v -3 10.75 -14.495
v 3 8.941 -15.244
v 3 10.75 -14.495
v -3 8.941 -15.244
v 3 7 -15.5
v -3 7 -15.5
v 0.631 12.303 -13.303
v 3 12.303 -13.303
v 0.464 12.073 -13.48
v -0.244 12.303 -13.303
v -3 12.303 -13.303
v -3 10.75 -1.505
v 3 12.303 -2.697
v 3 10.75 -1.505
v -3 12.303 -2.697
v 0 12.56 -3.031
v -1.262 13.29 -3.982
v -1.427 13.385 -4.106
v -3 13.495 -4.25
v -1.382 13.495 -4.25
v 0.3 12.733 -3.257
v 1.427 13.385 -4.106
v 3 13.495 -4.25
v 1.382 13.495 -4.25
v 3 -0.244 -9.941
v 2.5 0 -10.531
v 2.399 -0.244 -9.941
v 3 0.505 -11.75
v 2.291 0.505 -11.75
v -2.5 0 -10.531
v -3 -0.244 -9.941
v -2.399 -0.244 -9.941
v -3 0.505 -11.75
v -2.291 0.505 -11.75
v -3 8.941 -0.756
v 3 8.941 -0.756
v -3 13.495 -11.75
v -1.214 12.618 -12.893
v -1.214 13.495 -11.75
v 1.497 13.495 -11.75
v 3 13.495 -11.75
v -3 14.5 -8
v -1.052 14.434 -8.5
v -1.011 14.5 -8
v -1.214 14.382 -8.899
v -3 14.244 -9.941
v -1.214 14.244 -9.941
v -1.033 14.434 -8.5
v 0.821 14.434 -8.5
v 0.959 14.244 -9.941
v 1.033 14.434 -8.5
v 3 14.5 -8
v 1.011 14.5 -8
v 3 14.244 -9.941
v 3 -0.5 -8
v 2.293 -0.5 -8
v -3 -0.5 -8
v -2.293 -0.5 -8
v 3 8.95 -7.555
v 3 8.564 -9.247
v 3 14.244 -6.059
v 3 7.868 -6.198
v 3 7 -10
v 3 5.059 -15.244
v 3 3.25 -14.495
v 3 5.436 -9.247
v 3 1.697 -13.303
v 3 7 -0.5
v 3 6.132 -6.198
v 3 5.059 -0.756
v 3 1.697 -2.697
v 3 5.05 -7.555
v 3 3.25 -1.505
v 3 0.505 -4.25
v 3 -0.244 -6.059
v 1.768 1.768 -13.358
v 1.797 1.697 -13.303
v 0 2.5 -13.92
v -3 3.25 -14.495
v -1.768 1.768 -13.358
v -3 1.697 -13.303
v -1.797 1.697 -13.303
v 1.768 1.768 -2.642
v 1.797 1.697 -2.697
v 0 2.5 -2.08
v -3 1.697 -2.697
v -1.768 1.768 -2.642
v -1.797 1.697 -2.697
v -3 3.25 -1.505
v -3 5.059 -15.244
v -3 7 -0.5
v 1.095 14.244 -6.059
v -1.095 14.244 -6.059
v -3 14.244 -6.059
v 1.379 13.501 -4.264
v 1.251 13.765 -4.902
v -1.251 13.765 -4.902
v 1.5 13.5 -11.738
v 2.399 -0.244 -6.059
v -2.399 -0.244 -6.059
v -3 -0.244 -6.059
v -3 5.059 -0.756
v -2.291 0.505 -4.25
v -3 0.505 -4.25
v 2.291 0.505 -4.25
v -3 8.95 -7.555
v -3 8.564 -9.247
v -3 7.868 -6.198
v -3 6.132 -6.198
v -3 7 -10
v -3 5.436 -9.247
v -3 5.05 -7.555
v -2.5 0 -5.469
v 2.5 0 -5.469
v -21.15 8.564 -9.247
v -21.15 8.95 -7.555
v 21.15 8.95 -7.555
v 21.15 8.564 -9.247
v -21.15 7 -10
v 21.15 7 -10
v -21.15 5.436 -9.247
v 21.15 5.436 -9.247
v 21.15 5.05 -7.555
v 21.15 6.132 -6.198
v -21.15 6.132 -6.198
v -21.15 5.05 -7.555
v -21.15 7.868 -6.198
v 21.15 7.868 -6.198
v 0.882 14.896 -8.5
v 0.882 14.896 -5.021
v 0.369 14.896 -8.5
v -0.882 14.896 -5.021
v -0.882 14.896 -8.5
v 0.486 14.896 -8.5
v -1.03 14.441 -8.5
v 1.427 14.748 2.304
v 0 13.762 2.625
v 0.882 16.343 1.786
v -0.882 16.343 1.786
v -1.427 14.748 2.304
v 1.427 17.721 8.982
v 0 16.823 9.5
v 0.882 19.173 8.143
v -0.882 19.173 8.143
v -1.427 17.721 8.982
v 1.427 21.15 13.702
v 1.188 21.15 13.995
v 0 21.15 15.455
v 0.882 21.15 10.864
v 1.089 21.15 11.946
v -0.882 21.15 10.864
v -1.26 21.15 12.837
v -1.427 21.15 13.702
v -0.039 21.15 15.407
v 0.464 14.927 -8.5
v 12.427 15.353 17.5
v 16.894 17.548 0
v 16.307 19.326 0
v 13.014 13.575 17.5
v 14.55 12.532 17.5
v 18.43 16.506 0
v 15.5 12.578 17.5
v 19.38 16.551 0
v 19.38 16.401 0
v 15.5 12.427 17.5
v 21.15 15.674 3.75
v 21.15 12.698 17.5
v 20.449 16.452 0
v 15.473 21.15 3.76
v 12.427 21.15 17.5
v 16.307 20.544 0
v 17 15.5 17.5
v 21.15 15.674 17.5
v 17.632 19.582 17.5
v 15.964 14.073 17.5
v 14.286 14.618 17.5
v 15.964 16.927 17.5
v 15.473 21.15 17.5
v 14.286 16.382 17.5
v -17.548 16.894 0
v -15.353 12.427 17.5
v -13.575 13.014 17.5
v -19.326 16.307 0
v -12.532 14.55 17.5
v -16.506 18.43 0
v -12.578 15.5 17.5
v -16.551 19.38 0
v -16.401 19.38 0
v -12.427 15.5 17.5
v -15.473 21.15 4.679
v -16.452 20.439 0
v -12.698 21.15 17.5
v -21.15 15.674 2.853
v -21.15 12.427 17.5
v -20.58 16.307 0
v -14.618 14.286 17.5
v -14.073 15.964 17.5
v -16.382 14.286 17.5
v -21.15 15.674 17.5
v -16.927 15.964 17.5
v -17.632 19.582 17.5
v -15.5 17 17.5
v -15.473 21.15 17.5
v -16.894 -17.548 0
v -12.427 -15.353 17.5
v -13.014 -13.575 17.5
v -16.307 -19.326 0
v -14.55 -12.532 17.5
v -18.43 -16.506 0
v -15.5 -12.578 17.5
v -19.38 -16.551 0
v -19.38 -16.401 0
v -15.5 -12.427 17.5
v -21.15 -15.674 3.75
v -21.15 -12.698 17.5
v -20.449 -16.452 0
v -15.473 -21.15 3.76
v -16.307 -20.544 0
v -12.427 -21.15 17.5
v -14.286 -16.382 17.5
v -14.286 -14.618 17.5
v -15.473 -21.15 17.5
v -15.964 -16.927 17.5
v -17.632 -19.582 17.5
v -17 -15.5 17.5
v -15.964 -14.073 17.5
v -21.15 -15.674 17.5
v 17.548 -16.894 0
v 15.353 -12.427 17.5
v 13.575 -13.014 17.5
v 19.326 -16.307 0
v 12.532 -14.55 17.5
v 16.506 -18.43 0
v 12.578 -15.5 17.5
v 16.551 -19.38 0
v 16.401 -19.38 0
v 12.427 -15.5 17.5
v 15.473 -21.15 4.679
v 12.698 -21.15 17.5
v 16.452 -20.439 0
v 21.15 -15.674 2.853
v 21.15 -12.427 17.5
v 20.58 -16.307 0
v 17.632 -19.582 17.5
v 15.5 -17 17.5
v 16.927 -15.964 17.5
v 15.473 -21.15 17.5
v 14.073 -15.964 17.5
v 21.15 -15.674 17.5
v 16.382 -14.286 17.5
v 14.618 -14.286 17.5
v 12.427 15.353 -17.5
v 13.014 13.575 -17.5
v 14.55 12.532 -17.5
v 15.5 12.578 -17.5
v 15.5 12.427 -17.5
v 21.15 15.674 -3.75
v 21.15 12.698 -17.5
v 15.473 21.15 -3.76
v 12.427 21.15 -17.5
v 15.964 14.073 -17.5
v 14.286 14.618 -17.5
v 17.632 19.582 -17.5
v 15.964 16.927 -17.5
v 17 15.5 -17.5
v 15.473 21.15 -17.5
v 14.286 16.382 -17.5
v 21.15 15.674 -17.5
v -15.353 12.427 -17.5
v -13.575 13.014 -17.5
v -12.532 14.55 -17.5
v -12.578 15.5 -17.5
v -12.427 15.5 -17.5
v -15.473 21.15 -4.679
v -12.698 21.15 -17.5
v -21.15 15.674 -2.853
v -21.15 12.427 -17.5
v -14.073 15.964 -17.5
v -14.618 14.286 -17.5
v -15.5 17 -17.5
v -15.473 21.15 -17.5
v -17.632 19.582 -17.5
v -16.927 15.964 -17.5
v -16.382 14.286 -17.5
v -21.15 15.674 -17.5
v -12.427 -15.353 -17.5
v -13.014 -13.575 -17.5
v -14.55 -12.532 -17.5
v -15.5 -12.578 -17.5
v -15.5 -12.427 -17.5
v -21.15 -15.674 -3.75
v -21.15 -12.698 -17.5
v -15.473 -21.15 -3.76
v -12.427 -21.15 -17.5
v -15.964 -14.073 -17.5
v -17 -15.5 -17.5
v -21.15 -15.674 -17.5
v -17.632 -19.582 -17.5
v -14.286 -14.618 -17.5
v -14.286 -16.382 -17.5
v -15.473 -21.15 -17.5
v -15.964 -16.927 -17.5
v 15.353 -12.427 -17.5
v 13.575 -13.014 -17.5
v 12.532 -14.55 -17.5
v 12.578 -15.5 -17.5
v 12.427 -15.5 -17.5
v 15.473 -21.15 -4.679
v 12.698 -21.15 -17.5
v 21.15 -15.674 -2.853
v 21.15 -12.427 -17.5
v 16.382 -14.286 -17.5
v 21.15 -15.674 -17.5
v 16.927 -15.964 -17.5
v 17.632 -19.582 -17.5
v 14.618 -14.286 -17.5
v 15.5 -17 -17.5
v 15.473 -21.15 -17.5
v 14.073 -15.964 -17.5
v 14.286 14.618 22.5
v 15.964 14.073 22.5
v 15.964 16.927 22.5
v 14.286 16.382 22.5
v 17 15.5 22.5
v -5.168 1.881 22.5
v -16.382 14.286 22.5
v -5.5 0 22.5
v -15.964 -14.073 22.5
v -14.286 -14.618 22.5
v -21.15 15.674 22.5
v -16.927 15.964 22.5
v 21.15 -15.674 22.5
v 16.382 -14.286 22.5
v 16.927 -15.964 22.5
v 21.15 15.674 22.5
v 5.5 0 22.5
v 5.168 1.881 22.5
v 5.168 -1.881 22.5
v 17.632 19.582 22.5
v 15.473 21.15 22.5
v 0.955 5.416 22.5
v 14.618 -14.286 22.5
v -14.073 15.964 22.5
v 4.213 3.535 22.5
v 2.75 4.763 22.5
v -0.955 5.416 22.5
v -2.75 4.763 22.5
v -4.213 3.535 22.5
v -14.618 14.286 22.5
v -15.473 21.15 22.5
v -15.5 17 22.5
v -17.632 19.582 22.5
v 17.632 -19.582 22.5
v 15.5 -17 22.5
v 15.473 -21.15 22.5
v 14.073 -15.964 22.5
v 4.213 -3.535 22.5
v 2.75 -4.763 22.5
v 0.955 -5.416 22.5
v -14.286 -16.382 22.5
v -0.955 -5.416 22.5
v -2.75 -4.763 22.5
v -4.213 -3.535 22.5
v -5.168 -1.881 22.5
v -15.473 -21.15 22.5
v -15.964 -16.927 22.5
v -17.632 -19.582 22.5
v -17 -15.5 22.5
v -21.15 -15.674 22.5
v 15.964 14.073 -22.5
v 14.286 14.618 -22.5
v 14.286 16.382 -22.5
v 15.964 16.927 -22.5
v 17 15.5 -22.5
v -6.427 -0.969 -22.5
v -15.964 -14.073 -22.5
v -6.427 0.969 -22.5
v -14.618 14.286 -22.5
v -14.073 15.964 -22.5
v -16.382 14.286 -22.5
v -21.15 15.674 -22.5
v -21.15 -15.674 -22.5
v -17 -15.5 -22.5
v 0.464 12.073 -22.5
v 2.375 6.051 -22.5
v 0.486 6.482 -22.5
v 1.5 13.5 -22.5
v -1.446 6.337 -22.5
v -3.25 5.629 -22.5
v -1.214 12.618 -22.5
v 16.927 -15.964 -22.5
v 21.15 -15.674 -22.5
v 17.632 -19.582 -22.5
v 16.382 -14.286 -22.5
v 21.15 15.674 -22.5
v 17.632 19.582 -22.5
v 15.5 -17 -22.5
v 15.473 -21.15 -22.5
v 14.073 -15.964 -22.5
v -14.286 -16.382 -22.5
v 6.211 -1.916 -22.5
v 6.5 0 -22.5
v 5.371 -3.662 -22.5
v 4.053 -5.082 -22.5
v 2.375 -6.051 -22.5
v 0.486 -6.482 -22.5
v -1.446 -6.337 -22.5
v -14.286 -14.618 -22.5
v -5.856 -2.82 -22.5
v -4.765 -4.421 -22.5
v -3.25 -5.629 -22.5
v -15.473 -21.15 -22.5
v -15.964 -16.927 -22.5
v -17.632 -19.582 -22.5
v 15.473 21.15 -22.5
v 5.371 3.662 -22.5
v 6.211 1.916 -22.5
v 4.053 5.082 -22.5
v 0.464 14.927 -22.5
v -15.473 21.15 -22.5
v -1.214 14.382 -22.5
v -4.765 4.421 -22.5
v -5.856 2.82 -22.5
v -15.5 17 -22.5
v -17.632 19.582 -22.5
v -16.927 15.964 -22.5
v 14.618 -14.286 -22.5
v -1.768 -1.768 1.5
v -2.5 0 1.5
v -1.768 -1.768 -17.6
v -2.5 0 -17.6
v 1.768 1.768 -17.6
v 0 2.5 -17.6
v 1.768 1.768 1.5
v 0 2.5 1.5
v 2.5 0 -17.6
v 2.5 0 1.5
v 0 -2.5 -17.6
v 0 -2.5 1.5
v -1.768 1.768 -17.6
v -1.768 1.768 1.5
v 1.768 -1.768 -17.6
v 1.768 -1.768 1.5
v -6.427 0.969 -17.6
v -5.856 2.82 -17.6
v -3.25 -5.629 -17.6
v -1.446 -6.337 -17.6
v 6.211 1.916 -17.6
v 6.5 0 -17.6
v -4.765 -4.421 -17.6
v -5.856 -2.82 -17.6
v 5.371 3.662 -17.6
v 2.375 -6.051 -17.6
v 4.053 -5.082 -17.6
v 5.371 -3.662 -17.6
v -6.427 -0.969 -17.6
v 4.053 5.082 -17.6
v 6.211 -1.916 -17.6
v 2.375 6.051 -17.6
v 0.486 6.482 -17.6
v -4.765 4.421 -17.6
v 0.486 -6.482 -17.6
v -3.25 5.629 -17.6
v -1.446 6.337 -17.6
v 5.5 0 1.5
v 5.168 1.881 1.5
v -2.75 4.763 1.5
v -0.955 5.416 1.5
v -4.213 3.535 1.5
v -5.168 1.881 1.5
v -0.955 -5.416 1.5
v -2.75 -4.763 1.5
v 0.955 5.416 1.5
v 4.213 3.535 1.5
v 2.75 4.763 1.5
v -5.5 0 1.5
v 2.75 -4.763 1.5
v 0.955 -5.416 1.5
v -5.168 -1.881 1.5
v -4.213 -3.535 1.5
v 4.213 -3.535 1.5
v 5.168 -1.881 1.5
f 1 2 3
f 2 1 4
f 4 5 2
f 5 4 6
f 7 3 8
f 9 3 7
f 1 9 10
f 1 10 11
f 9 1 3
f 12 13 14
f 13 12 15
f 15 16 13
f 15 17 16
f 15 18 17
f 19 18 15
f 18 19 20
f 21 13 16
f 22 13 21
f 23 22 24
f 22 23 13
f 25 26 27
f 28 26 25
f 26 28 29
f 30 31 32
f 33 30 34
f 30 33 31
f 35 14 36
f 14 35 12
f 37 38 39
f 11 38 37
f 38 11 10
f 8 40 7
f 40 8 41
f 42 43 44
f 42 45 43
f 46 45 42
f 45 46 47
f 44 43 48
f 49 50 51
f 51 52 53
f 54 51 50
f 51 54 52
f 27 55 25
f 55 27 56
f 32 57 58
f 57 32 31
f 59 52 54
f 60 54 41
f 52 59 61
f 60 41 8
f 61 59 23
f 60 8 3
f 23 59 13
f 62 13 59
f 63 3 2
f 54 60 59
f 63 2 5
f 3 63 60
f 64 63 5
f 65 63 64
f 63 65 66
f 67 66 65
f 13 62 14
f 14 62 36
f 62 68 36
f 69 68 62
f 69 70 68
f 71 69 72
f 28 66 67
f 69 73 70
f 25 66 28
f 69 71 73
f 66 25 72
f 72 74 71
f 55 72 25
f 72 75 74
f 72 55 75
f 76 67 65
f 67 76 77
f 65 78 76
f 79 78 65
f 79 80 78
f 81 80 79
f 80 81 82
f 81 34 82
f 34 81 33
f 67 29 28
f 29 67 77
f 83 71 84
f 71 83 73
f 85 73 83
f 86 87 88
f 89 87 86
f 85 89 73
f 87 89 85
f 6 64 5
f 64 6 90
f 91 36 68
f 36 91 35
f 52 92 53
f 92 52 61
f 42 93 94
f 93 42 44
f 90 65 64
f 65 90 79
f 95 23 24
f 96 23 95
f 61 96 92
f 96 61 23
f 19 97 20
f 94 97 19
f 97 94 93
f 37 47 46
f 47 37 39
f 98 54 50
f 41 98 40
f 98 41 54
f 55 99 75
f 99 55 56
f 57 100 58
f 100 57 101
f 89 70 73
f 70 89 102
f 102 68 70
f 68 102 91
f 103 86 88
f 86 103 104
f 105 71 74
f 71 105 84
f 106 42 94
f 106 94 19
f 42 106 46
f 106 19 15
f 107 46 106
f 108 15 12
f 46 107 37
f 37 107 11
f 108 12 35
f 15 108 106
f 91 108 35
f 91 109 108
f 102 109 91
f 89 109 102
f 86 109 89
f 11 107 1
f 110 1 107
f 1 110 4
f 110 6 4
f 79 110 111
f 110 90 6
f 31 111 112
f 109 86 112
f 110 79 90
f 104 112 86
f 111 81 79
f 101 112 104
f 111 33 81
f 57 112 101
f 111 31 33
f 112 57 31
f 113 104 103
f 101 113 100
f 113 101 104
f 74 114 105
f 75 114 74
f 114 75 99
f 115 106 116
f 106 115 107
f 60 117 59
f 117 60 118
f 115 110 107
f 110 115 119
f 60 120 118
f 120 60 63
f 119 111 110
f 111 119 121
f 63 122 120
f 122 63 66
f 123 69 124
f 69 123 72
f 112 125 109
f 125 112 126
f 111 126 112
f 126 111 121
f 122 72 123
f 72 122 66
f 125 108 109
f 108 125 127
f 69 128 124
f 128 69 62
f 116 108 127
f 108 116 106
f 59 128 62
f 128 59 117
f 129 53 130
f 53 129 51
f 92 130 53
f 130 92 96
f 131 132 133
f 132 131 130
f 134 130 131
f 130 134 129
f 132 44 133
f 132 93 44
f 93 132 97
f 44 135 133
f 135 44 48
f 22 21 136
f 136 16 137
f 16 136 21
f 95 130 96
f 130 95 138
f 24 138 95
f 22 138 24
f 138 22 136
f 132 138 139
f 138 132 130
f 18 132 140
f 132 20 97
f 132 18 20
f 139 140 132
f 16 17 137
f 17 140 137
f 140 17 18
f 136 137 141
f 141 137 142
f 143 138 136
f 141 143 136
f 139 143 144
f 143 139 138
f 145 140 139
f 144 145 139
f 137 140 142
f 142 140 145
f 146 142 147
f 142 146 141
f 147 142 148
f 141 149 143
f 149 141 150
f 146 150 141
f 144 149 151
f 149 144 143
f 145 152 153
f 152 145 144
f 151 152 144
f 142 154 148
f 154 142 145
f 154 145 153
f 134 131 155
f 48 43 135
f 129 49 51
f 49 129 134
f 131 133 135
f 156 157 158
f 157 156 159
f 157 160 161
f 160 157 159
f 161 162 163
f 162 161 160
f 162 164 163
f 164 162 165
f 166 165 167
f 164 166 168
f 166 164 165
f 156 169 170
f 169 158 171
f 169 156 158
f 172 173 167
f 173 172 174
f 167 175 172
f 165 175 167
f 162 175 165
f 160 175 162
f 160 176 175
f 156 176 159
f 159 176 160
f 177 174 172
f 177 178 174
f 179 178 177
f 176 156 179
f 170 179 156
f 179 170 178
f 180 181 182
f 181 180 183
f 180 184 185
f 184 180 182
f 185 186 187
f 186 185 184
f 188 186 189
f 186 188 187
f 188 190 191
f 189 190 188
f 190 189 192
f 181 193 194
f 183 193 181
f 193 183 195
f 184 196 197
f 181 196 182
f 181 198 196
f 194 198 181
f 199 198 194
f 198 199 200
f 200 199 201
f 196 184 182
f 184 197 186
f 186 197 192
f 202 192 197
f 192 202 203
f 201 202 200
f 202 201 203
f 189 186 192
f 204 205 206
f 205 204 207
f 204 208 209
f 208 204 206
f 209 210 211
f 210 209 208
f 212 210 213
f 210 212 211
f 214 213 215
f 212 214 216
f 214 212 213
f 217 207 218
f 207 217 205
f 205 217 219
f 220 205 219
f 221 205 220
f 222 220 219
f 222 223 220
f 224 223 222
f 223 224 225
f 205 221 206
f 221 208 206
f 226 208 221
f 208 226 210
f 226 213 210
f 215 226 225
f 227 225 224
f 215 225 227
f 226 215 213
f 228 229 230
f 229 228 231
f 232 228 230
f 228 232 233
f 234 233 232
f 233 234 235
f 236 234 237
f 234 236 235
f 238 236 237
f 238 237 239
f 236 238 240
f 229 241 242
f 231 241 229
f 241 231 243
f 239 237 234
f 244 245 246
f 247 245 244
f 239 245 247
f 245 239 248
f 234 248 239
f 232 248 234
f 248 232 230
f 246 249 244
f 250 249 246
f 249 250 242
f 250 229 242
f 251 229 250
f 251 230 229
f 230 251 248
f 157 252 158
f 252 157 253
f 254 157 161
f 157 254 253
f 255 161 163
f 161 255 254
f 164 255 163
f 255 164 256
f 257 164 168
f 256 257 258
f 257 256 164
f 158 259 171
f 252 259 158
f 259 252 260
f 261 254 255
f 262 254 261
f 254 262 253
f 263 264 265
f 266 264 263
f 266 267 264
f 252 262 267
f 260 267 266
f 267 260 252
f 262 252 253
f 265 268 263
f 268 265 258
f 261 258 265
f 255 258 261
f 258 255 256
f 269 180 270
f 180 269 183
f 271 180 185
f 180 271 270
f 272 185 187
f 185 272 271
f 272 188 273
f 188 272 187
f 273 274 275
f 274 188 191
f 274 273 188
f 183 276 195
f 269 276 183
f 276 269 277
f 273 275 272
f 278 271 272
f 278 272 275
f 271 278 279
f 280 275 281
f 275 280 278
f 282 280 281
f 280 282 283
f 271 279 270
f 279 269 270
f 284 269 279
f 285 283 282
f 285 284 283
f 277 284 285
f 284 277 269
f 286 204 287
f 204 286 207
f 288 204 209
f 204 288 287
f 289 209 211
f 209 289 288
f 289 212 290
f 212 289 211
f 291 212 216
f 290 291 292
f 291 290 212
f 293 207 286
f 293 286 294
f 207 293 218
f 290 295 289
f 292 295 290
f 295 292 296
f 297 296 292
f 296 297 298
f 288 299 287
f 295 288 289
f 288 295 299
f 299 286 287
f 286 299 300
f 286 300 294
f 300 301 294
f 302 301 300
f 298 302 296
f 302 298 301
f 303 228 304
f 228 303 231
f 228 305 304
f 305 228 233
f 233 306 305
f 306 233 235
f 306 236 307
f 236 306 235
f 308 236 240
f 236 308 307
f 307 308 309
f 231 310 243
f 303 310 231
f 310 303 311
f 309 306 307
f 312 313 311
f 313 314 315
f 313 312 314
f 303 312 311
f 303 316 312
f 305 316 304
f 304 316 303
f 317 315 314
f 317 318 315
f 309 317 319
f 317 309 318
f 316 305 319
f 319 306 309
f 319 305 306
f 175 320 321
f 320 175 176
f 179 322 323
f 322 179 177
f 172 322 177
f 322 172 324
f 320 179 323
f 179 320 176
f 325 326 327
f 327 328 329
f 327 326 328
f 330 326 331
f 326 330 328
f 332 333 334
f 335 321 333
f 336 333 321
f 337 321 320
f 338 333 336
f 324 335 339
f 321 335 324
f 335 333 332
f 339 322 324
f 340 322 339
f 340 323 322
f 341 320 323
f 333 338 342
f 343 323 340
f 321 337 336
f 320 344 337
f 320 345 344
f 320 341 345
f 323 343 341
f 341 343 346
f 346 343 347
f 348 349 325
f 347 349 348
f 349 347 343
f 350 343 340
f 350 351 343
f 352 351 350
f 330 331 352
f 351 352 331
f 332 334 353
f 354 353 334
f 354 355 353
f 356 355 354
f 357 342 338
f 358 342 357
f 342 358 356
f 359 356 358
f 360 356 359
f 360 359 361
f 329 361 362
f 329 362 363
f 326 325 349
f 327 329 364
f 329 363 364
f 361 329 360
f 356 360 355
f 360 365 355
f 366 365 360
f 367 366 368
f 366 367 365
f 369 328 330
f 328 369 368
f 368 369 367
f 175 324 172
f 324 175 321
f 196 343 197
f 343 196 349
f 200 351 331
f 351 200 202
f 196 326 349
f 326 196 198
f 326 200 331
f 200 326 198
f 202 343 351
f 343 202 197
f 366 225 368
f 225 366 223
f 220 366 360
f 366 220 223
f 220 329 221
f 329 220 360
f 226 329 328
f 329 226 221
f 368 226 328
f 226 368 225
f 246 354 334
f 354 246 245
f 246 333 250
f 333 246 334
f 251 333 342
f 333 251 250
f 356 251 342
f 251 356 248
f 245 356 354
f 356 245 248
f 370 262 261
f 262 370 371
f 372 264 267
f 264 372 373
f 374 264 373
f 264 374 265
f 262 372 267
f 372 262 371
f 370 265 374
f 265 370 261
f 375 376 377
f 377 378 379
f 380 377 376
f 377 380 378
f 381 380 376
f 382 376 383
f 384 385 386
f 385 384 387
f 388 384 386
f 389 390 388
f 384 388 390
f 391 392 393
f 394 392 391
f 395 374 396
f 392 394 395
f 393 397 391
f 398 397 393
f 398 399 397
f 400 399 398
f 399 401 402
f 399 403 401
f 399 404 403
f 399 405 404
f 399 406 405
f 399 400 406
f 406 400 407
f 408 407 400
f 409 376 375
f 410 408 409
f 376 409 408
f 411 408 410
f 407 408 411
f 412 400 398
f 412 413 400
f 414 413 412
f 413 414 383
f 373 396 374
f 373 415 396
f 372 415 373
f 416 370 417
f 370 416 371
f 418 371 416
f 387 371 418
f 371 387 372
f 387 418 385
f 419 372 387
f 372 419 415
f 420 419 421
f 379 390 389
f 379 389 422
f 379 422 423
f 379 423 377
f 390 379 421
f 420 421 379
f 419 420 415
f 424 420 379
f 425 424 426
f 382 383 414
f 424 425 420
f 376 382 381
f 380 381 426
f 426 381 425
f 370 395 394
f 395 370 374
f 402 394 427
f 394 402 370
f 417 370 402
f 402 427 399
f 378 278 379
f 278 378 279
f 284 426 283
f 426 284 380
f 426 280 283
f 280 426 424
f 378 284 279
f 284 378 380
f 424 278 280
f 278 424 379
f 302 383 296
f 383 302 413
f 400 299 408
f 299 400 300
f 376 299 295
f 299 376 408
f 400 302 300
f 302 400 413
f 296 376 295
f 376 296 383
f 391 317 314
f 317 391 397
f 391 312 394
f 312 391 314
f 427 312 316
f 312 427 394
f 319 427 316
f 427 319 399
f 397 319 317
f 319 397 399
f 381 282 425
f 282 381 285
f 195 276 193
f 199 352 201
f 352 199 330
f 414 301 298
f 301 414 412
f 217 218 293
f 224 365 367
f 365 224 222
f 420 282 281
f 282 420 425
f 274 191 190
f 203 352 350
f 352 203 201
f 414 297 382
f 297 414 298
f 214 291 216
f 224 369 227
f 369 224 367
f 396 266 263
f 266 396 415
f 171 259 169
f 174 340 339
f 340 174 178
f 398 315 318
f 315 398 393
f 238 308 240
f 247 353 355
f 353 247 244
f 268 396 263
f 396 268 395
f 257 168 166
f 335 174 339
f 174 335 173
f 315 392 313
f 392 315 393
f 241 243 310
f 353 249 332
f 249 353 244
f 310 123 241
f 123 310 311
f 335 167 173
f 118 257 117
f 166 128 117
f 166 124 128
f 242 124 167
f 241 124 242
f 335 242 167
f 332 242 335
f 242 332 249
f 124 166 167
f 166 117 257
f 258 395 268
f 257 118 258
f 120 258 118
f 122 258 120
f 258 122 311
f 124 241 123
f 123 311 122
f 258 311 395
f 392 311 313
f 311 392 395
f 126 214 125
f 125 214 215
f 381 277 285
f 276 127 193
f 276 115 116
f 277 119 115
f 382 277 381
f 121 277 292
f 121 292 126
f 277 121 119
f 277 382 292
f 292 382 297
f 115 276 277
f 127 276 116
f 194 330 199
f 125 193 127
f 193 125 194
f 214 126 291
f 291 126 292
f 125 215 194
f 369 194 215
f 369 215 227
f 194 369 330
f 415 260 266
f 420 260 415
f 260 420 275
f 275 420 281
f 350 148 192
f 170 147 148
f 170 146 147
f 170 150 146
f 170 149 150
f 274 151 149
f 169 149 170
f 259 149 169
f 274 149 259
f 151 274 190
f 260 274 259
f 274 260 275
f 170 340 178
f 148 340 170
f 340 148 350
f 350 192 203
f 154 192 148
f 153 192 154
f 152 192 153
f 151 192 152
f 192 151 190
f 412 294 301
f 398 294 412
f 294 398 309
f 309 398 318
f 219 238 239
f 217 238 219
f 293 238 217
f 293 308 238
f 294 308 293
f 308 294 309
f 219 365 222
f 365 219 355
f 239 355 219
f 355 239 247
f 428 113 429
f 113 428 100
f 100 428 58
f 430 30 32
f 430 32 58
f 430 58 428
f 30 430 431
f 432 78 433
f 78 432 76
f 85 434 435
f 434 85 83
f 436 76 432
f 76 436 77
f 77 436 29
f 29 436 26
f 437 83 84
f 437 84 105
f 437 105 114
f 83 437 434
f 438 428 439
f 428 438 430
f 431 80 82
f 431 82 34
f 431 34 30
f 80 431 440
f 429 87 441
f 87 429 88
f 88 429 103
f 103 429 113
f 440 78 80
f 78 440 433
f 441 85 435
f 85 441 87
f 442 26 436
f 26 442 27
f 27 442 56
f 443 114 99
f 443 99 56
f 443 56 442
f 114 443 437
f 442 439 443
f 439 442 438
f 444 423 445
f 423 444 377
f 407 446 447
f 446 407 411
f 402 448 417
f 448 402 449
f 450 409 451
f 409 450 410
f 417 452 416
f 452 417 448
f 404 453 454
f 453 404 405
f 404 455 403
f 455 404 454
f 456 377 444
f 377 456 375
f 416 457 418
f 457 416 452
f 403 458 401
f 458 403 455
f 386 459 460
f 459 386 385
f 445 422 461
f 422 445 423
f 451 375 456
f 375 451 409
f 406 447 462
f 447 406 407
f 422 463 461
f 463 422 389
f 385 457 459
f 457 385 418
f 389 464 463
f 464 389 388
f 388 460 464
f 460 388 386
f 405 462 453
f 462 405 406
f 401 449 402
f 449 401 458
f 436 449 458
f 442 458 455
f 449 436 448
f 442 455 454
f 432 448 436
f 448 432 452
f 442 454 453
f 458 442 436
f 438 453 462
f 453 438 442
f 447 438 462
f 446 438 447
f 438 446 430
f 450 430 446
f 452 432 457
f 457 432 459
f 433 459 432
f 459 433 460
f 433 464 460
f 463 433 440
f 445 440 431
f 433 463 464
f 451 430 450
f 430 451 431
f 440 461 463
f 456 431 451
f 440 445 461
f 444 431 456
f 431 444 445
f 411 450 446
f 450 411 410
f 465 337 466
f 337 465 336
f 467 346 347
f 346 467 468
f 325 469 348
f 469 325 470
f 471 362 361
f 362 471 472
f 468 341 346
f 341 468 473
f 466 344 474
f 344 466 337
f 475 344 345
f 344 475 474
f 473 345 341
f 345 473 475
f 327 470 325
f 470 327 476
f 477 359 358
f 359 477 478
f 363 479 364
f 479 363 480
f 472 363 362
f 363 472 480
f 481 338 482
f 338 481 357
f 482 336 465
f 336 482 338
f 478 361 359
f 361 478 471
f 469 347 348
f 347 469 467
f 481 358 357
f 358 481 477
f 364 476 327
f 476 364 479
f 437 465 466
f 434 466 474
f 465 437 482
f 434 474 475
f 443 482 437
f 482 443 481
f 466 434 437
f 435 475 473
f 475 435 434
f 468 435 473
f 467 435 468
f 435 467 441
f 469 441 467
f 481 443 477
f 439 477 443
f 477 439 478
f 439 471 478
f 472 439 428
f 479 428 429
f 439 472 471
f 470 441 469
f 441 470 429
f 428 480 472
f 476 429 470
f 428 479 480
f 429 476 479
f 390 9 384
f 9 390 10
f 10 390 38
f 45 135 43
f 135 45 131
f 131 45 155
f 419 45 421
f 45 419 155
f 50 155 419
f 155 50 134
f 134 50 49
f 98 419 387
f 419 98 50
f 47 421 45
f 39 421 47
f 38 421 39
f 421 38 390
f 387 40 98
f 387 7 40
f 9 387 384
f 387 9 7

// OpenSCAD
//nema17();
//motor_coupling();
//assembly();

//bearing625();

//	$fa = 0.1;
//	$fs = 0.1;


filamentDriveHousing();

module assembly()
{
	nema17();
	translate([0,0,2])
		motor_coupling();
}

module nema17()
{
	$fa = 0.1;
	$fs = 0.1;

	shaftLength = 10;

	color([0.75, 0.75, 0.75])
	{
		translate([0,0,-34/2])
		{
			difference()
			{
				union()
				{
					cube(size = [42.3, 42.3, 34], center = true);
					translate([0,0,34/2])
						cylinder(r=11, h=2);
					translate([0,0,34/2+2])
						cylinder(r=2.5, h=shaftLength);
				}
		
				difference()
				{
					cylinder(r=30, h=40, center=true);
					cylinder(r=52.7/2, h=40, center=true);
				}
		
				for (i=[0:3])
				{
					rotate([0, 0, 90*i])
						translate([31/2, 31/2, 34/2-4.4])
							cylinder(r=1.5, h=4.5);
				}
			}
		}
	}
}

module filamentDriveHousing()
{
	height = 45;
	width = 42.3;
	angle = 12.5;

	color([0.75, 0.25, 0.25])
	{
		translate([0,0,0])
		{
			difference()
			{
				union()
				{
					cube(size = [width, width, height], center = true);
				}

				cylinder(r=5/2, h=height+1, center = true);
				
				translate([0,0,-(height/2+0.1)])
					cylinder(r=13/2, h=5);

				translate([0,0,height/2-21])
					cylinder(r=11/2, h=21);

				translate([0,7, -8])
				{
					rotate([0, 90, 0])
					{
						cylinder(r=7.5, h=6, center=true);
						cylinder(r=2, h=width+1, center=true);
					}
				}

				translate([0, 13.5, -height/2])
					cylinder(r=1.5, h=14);

				translate([0,34.5+13.5, -8.5])
				{
					intersection()
					{
						rotate([0, 90, 0])
							rotate_extrude()
								translate([34.5, 0, 0])
									circle(r=1.5);
						translate([0,0,50])
							cube(size = [100, 100, 100], center=true);
					}
				}

				for(i=[0:3])
				{
					rotate([0,0,i*90])
					{
						translate([31/2, 31/2, height/2-5])
						{
							difference()
							{
								rotate([angle, -angle, 0])
								{
									union()
									{
										cylinder(r=3, h=100, center=true);
										translate([3, 0, 0])
											cube(size=[6,6,100], center=true);	
										translate([0, 3, 0])
											cube(size=[6,6,100], center=true);
									}
								}
							
								translate([0,0,50])
									cube(size=[100, 100, 100], center=true);
							}
						}
					}
				}
				
				for(i=[0:3])
				{
					rotate([0,0,i*90])
					{
						translate([31/2, 31/2, -(height/2-5)])
						{
							difference()
							{
								rotate([-angle, angle, 0])
								{
									union()
									{
										cylinder(r=3, h=100, center=true);
										translate([3, 0, 0])
											cube(size=[6,6,100], center=true);	
										translate([0, 3, 0])
											cube(size=[6,6,100], center=true);
									}
								}
							
								translate([0,0,-50])
									cube(size=[100, 100, 100], center=true);
							}
						}
					}
				}

				for (i=[0:3])
				{
					rotate([0, 0, 90*i])
						translate([31/2, 31/2, height/2-5])
							cylinder(r=1.5, h=5);
				}


				for (i=[0:3])
				{
					rotate([0, 0, 90*i])
						translate([31/2, 31/2, -height/2])
							cylinder(r=1.5, h=5);
				}

				difference()
				{
					cylinder(r=35, h=height+1, center=true);
					cylinder(r=52.7/2, h=height+1, center=true);
				}
			}
		}
	}
}

module motor_coupling()
{
	$fa = 0.1;
	$fs = 0.1;

	length = 20;
	diameter = 11;
	bore1 = 4;
	bore2 = 5;
	setScrew = 3;
	setScrewOffset = 5;

	difference()
	{
		cylinder(r=diameter/2, h=length);
		cylinder(r=bore1/2, h=length);
		translate([0,0,length/2])
			cylinder(r=bore2/2, h=length/2);

		translate([0,0,setScrewOffset])
			rotate([90, 0, 0])
				cylinder(r=setScrew/2, h=diameter/2);

		translate([0,0,length-setScrewOffset])
			rotate([90, 0, 0])
				cylinder(r=setScrew/2, h=diameter/2);
	}
}

module drive_rod()
{
	dia = 4;
	length = 40;

	cylinder(r=dia/2, h=length);
}

module bearing625()
{
	od = 13;
	id = 4;
	height = 5;

	difference()
	{
		cylinder(r=od/2, h=height);
		cylinder(r=id/2, h=height);
	}
}
